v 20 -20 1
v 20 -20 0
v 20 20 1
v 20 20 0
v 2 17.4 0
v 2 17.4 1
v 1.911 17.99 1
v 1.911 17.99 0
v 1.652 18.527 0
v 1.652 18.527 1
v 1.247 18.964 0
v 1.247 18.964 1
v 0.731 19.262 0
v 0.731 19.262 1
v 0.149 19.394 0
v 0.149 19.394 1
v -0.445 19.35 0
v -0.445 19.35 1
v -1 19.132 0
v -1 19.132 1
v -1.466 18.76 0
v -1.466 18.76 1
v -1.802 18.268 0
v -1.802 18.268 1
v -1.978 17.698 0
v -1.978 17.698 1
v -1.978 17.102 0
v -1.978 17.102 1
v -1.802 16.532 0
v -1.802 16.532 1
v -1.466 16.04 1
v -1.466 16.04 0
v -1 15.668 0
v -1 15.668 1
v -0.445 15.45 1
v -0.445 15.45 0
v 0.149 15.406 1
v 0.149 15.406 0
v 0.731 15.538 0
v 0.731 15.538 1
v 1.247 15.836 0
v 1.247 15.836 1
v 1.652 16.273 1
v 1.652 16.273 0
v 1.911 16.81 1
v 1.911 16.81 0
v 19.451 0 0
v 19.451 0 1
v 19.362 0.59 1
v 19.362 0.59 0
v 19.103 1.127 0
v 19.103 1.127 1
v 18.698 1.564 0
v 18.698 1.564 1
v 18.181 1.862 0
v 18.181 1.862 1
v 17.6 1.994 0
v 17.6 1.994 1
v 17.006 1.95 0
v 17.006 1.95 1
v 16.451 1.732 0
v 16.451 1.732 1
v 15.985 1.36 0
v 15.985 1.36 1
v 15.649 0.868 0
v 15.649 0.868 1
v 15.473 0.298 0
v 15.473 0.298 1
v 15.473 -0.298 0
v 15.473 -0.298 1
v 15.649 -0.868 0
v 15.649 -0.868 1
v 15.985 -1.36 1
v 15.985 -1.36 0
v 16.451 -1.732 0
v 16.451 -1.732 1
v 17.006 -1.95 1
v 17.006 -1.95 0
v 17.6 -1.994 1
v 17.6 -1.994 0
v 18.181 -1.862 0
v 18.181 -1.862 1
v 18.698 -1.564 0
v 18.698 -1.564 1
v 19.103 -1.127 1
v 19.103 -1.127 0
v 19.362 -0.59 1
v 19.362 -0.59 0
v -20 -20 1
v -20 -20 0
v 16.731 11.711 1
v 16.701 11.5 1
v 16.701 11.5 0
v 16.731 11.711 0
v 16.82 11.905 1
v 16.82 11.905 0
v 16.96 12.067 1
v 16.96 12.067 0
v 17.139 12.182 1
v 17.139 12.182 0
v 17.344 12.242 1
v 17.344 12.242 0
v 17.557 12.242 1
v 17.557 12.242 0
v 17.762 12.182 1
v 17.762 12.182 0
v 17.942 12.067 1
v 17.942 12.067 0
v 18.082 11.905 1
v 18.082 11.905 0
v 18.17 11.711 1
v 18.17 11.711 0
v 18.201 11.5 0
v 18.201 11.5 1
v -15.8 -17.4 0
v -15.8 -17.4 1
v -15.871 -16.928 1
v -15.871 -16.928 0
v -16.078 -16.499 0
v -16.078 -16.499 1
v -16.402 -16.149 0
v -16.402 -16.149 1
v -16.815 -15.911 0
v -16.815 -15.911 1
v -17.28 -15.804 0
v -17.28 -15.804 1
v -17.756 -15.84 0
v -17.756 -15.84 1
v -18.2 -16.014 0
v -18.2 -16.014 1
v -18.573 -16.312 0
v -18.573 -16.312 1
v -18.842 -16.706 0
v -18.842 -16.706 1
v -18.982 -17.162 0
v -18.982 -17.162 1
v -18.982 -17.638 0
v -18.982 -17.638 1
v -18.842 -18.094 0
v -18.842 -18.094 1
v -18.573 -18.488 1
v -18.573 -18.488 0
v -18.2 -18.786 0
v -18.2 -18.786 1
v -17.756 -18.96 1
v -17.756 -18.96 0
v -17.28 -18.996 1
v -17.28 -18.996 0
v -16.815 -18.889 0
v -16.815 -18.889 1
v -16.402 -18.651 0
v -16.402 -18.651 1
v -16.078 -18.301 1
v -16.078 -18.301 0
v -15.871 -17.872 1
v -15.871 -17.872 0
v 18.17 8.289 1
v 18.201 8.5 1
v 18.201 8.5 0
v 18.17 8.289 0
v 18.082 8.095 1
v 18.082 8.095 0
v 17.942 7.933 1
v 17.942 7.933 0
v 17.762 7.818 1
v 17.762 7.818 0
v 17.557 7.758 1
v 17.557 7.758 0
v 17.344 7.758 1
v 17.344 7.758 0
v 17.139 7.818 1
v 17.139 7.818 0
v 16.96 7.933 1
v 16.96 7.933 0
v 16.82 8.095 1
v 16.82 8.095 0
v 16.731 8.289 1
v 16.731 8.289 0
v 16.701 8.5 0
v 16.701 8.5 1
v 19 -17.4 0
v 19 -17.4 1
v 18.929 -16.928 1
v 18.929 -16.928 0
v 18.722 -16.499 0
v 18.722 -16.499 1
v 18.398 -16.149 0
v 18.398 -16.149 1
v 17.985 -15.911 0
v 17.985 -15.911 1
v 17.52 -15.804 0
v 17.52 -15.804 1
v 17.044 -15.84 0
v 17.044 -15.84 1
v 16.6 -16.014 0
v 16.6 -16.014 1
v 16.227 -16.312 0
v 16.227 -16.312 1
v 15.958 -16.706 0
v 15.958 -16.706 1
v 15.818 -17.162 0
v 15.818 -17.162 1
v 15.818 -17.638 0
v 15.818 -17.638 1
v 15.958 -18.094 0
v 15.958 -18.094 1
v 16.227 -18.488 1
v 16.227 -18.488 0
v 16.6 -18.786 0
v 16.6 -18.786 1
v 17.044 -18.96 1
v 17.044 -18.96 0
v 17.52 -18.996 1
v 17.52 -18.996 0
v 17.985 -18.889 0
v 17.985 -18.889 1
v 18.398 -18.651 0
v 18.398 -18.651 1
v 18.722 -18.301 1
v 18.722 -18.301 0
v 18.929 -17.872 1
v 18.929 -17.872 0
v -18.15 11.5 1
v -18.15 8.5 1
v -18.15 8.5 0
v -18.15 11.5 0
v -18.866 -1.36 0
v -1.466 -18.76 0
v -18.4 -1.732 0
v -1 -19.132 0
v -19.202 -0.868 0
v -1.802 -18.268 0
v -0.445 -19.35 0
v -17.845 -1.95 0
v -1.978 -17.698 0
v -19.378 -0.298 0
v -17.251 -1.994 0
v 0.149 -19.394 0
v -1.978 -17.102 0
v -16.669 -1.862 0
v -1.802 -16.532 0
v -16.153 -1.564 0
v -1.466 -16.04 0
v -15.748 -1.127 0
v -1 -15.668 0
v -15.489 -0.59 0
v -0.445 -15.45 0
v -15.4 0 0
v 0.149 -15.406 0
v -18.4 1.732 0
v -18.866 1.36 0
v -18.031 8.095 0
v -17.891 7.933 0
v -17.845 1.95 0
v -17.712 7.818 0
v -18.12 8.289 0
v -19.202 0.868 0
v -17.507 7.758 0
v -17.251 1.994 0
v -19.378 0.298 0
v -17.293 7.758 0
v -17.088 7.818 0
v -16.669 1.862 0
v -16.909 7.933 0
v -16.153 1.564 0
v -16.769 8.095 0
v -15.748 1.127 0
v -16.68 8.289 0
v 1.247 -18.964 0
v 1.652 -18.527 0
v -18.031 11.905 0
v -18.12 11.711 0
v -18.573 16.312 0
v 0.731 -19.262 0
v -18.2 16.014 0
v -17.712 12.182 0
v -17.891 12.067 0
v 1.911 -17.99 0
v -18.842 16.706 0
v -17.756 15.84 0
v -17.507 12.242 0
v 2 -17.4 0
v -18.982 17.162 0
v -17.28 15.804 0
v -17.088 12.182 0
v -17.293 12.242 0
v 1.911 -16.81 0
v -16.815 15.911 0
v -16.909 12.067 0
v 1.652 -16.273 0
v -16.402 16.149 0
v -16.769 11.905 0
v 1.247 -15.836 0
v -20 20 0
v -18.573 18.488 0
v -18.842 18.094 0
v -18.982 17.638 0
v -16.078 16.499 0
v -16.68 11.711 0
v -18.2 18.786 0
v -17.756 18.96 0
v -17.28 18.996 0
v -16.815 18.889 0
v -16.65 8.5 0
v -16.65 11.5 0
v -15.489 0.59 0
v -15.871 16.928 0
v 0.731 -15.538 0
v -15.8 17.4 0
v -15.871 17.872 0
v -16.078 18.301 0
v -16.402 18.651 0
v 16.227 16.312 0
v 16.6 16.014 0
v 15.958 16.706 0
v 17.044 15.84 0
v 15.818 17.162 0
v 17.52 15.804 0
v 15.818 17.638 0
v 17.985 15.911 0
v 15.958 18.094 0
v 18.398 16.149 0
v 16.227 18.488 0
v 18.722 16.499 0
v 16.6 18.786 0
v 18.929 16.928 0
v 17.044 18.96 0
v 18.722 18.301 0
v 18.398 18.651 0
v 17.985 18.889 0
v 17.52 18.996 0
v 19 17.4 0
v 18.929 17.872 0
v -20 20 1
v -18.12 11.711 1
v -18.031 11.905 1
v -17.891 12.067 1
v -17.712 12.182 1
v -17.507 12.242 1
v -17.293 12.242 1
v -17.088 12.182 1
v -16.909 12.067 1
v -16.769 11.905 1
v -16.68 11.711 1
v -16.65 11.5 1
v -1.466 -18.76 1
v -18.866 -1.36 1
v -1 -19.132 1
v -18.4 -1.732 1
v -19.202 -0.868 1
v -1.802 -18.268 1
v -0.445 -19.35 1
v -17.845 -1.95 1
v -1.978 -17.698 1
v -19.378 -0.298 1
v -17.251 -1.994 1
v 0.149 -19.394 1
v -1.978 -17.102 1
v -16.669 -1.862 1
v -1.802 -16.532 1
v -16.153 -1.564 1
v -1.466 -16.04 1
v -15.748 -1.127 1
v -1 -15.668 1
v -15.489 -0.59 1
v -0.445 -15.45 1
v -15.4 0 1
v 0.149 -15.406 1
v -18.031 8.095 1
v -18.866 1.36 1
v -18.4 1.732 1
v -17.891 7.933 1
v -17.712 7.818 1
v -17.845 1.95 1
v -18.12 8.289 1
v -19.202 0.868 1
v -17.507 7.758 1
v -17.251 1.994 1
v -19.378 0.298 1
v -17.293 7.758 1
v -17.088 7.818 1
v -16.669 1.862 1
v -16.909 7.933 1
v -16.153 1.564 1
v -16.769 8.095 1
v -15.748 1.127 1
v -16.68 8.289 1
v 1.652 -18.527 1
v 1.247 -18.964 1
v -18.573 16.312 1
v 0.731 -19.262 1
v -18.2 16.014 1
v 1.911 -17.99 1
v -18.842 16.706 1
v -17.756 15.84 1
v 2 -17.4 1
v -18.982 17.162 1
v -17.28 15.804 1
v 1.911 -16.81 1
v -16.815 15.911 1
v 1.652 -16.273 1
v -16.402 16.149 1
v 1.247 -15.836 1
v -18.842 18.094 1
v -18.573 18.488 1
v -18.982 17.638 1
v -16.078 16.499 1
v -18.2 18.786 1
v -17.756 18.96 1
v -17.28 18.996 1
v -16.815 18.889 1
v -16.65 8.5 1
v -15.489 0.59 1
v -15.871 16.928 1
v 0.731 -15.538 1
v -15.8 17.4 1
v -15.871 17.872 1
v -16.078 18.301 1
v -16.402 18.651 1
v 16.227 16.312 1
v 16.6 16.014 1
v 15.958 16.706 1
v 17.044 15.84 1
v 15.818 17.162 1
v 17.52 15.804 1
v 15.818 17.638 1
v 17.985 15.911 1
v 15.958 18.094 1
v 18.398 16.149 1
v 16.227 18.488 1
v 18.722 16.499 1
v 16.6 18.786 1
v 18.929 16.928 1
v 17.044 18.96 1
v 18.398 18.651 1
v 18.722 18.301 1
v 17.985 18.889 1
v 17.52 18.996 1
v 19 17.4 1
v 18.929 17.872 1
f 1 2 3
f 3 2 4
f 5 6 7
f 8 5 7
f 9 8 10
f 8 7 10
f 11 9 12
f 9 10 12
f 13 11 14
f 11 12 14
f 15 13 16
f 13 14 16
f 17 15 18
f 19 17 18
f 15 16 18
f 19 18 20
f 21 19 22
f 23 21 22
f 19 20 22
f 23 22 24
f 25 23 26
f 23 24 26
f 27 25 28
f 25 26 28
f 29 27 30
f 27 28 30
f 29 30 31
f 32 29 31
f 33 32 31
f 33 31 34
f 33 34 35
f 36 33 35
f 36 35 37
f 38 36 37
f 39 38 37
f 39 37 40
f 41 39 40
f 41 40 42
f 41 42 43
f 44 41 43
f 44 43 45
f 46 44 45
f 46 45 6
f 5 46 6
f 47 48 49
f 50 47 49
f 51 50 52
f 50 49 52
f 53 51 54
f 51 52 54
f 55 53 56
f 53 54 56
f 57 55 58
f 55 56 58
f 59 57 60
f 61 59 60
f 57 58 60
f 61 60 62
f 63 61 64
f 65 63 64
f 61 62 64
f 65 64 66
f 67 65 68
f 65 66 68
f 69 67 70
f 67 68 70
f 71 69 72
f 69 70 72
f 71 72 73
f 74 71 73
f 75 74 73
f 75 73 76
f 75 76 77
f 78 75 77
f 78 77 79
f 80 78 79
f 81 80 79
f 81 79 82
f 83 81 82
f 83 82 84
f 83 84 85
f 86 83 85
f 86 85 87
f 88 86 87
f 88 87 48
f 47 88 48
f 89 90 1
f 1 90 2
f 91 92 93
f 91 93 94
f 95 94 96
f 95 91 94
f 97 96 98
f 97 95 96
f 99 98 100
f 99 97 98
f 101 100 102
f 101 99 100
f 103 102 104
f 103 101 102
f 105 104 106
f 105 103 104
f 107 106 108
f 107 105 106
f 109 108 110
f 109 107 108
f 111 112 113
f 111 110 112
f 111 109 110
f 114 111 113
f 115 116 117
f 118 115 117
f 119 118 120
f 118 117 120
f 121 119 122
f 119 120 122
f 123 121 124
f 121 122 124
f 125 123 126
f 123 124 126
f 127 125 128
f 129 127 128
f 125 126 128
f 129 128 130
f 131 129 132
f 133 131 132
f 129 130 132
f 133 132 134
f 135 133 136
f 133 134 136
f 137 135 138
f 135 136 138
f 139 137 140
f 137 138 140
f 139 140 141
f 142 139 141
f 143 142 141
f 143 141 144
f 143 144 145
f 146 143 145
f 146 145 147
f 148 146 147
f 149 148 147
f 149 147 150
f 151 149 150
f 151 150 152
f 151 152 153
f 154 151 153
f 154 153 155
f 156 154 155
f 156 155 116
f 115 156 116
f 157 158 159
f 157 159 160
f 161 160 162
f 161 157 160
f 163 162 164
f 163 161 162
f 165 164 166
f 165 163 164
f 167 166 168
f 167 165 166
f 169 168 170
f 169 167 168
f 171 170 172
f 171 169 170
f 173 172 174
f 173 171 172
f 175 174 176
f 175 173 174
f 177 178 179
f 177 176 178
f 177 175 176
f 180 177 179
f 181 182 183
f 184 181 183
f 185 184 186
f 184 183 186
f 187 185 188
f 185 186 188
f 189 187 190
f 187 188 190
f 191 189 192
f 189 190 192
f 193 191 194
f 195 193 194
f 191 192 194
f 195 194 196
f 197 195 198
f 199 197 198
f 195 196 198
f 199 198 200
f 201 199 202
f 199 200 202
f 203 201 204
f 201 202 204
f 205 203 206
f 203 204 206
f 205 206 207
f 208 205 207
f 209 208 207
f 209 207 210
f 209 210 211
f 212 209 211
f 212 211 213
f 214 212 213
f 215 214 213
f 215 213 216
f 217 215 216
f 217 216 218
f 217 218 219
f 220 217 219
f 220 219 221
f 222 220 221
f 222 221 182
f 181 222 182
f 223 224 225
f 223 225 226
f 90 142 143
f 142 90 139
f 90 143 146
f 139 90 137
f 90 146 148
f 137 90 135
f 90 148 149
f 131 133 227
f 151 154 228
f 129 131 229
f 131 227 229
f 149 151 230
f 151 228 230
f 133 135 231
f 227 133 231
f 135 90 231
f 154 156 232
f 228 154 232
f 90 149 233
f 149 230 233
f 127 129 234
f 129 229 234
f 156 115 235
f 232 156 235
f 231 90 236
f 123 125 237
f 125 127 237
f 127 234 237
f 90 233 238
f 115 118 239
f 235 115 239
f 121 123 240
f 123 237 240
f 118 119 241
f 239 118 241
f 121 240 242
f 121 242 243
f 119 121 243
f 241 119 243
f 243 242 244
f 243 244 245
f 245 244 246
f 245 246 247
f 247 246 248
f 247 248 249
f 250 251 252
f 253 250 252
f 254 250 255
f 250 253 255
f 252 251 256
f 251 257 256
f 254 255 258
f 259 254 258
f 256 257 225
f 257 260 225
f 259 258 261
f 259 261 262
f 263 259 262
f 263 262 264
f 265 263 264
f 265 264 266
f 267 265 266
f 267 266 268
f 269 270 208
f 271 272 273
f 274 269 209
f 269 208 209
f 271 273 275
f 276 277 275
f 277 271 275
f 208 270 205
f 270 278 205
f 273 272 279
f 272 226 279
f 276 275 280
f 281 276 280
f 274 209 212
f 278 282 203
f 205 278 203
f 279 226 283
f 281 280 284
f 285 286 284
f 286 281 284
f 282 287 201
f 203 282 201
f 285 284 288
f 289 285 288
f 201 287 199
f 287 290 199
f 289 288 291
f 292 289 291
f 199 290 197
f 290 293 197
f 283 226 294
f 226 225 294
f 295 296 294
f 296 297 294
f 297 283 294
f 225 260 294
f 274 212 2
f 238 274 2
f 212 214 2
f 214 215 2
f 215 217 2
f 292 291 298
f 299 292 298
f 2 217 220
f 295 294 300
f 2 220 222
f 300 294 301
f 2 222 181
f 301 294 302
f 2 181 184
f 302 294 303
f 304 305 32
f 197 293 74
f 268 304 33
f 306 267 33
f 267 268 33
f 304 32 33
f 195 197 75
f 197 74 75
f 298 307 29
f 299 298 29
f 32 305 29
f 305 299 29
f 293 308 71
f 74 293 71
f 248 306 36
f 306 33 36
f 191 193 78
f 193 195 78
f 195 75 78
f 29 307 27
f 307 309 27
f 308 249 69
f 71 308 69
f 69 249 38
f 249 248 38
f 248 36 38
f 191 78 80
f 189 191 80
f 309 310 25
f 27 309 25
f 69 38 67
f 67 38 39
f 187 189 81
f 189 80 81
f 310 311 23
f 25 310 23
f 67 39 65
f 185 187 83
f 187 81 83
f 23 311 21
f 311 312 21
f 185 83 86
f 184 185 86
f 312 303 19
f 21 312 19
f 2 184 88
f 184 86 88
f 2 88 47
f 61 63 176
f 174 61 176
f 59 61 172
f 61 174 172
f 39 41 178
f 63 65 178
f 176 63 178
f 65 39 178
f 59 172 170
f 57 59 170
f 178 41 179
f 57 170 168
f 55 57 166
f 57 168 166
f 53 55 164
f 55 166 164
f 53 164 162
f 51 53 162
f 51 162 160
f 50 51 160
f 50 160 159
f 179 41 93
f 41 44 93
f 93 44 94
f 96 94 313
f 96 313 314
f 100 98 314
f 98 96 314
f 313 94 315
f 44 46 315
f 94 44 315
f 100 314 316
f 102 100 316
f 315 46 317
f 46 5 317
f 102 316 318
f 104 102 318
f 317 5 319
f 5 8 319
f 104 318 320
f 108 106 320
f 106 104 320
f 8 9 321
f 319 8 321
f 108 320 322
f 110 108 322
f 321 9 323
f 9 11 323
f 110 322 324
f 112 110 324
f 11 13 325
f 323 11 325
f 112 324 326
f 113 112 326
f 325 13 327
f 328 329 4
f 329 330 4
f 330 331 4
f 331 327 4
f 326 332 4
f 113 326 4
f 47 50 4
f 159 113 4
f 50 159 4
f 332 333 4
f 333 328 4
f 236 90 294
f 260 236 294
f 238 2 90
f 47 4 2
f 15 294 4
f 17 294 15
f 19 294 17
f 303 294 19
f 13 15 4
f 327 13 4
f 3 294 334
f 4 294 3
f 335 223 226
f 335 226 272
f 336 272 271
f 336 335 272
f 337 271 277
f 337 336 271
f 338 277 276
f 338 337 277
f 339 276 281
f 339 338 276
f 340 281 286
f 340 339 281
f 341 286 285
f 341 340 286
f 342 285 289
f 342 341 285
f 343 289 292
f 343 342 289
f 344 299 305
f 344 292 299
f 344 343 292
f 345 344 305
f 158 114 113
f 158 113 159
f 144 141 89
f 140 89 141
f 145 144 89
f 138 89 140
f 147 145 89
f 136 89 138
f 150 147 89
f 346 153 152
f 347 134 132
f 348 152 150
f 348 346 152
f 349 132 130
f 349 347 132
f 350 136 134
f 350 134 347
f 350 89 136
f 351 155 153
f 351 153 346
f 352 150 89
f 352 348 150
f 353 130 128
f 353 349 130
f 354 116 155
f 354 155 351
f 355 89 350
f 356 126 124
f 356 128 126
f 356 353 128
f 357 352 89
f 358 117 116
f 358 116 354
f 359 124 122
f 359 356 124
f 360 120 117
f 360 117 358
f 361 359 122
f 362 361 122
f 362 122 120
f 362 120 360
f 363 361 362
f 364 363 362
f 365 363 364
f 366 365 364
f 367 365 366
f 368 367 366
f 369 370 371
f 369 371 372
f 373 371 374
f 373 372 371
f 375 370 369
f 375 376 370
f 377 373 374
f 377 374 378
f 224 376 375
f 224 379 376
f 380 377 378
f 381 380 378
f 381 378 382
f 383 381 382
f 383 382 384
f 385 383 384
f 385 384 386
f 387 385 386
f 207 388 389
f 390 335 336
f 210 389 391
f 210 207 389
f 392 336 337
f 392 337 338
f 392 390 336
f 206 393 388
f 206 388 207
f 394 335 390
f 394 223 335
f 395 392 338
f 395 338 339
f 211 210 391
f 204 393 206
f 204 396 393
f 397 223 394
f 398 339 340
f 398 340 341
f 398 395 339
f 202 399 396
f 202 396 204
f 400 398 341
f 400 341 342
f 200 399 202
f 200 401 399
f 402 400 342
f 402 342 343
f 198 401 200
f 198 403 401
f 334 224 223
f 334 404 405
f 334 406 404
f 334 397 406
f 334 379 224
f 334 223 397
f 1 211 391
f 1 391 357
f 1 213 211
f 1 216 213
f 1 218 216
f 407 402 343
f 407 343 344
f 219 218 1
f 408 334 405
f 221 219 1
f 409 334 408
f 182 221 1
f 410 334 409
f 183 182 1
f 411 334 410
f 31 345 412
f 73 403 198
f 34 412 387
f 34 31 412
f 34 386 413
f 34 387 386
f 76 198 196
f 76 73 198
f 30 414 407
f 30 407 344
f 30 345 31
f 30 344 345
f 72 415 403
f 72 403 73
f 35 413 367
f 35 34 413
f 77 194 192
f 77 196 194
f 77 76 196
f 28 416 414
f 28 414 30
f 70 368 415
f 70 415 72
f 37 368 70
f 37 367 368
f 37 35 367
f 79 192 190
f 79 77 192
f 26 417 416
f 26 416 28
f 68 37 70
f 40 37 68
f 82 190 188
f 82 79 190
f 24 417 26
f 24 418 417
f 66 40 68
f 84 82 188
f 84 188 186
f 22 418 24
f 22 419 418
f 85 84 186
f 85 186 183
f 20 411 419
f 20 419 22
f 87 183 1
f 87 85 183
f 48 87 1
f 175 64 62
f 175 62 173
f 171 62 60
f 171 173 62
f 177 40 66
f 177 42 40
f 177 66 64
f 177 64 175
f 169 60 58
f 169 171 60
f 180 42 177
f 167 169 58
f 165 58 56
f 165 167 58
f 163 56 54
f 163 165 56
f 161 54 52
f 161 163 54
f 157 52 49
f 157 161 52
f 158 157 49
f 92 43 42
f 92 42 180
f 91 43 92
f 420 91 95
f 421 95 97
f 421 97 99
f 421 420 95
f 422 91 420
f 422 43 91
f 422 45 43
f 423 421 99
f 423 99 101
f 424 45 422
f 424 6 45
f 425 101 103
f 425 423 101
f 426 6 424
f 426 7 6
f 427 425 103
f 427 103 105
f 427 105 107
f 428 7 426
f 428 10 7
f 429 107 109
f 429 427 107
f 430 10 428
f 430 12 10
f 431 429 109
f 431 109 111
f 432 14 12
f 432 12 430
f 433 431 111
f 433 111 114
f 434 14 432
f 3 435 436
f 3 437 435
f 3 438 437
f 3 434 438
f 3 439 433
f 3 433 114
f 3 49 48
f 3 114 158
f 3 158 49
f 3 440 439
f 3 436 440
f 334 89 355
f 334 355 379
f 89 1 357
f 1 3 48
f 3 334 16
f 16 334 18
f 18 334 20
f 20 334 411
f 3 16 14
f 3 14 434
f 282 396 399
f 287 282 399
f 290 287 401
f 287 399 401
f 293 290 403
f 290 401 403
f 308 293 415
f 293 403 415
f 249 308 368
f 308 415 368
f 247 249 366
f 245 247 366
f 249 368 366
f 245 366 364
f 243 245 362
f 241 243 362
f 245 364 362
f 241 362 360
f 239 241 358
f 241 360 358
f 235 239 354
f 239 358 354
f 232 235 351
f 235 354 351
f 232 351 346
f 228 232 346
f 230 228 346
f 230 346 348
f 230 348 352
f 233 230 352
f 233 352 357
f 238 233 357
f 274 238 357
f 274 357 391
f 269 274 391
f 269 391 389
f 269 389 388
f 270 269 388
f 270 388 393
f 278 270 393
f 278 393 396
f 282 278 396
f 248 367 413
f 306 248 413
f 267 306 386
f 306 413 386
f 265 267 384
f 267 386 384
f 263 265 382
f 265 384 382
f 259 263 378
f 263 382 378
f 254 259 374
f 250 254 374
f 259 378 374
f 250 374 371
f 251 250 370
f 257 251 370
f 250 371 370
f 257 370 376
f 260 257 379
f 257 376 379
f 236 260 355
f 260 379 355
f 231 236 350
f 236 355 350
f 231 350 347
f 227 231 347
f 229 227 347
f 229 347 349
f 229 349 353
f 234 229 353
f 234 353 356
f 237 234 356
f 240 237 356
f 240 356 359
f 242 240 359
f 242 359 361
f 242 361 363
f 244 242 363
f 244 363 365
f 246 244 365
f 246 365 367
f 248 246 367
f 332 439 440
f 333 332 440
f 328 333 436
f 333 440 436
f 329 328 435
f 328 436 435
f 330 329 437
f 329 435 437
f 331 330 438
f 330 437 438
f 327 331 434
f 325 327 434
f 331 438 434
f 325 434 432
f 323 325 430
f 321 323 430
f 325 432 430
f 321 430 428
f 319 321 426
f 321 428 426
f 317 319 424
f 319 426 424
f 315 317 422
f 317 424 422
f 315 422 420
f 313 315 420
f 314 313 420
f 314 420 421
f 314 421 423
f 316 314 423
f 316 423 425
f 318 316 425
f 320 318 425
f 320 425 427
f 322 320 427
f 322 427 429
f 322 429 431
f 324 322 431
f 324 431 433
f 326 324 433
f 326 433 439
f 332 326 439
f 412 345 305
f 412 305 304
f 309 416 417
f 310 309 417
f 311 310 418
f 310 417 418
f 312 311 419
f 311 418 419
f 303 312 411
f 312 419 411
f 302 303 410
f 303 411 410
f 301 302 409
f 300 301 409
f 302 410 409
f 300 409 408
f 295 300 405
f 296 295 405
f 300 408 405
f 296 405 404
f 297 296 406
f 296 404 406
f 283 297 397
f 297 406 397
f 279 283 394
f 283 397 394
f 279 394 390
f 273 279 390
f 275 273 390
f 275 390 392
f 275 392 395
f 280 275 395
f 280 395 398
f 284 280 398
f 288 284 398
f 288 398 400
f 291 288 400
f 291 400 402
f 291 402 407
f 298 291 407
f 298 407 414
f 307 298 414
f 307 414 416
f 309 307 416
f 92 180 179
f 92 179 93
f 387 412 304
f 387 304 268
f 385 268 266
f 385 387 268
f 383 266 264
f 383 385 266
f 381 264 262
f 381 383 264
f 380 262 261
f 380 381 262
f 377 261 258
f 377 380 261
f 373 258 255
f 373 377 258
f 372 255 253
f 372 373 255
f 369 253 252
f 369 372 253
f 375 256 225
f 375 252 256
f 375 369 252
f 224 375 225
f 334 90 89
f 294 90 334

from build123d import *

# Parameters (mm, degrees)
SKETCH1_W           = 40
SKETCH1_H           = 40
BOSS_EXTRUDE1_DEPTH = 1
SKETCH2_R           = 1.6
SKETCH2_R_2         = 2
CUT_EXTRUDE1_DEPTH  = 10


with BuildPart() as part:
    # Sketch1 → Boss-Extrude1 (new body)
    with BuildSketch(Plane.XY):
        Rectangle(SKETCH1_W, SKETCH1_H)
    extrude(amount=BOSS_EXTRUDE1_DEPTH)

    # Sketch2 → Cut-Extrude1 (cut)
    with BuildSketch(Plane.XY.offset(1)):
        with Locations((-17.4, -17.4)):
            Circle(SKETCH2_R)
        with Locations((17.4, -17.4)):
            Circle(SKETCH2_R)
        with Locations((17.4, 17.4)):
            Circle(SKETCH2_R)
        with Locations((-17.4, 17.4)):
            Circle(SKETCH2_R)
        with Locations((0, 17.4)):
            Circle(SKETCH2_R_2)
        with Locations((17.450650527, 0)):
            Circle(SKETCH2_R_2)
        with Locations((0, -17.4)):
            Circle(SKETCH2_R_2)
        with Locations((-17.4, 0)):
            Circle(SKETCH2_R_2)
        with BuildLine():
            Line((-16.65, 11.5), (-16.65, 8.5))
            ThreePointArc((-16.65, 8.5), (-17.4, 7.75), (-18.15, 8.5))
            Line((-18.15, 8.5), (-18.15, 11.5))
            ThreePointArc((-18.15, 11.5), (-17.4, 12.25), (-16.65, 11.5))
        make_face()
        with BuildLine():
            Line((18.200650527, 11.5), (18.200650527, 8.5))
            ThreePointArc((18.200650527, 8.5), (17.450650527, 7.75), (16.700650527, 8.5))
            Line((16.700650527, 8.5), (16.700650527, 11.5))
            ThreePointArc((16.700650527, 11.5), (17.450650527, 12.25), (18.200650527, 11.5))
        make_face()
    extrude(amount=-CUT_EXTRUDE1_DEPTH, mode=Mode.SUBTRACT)


solid = part.part
